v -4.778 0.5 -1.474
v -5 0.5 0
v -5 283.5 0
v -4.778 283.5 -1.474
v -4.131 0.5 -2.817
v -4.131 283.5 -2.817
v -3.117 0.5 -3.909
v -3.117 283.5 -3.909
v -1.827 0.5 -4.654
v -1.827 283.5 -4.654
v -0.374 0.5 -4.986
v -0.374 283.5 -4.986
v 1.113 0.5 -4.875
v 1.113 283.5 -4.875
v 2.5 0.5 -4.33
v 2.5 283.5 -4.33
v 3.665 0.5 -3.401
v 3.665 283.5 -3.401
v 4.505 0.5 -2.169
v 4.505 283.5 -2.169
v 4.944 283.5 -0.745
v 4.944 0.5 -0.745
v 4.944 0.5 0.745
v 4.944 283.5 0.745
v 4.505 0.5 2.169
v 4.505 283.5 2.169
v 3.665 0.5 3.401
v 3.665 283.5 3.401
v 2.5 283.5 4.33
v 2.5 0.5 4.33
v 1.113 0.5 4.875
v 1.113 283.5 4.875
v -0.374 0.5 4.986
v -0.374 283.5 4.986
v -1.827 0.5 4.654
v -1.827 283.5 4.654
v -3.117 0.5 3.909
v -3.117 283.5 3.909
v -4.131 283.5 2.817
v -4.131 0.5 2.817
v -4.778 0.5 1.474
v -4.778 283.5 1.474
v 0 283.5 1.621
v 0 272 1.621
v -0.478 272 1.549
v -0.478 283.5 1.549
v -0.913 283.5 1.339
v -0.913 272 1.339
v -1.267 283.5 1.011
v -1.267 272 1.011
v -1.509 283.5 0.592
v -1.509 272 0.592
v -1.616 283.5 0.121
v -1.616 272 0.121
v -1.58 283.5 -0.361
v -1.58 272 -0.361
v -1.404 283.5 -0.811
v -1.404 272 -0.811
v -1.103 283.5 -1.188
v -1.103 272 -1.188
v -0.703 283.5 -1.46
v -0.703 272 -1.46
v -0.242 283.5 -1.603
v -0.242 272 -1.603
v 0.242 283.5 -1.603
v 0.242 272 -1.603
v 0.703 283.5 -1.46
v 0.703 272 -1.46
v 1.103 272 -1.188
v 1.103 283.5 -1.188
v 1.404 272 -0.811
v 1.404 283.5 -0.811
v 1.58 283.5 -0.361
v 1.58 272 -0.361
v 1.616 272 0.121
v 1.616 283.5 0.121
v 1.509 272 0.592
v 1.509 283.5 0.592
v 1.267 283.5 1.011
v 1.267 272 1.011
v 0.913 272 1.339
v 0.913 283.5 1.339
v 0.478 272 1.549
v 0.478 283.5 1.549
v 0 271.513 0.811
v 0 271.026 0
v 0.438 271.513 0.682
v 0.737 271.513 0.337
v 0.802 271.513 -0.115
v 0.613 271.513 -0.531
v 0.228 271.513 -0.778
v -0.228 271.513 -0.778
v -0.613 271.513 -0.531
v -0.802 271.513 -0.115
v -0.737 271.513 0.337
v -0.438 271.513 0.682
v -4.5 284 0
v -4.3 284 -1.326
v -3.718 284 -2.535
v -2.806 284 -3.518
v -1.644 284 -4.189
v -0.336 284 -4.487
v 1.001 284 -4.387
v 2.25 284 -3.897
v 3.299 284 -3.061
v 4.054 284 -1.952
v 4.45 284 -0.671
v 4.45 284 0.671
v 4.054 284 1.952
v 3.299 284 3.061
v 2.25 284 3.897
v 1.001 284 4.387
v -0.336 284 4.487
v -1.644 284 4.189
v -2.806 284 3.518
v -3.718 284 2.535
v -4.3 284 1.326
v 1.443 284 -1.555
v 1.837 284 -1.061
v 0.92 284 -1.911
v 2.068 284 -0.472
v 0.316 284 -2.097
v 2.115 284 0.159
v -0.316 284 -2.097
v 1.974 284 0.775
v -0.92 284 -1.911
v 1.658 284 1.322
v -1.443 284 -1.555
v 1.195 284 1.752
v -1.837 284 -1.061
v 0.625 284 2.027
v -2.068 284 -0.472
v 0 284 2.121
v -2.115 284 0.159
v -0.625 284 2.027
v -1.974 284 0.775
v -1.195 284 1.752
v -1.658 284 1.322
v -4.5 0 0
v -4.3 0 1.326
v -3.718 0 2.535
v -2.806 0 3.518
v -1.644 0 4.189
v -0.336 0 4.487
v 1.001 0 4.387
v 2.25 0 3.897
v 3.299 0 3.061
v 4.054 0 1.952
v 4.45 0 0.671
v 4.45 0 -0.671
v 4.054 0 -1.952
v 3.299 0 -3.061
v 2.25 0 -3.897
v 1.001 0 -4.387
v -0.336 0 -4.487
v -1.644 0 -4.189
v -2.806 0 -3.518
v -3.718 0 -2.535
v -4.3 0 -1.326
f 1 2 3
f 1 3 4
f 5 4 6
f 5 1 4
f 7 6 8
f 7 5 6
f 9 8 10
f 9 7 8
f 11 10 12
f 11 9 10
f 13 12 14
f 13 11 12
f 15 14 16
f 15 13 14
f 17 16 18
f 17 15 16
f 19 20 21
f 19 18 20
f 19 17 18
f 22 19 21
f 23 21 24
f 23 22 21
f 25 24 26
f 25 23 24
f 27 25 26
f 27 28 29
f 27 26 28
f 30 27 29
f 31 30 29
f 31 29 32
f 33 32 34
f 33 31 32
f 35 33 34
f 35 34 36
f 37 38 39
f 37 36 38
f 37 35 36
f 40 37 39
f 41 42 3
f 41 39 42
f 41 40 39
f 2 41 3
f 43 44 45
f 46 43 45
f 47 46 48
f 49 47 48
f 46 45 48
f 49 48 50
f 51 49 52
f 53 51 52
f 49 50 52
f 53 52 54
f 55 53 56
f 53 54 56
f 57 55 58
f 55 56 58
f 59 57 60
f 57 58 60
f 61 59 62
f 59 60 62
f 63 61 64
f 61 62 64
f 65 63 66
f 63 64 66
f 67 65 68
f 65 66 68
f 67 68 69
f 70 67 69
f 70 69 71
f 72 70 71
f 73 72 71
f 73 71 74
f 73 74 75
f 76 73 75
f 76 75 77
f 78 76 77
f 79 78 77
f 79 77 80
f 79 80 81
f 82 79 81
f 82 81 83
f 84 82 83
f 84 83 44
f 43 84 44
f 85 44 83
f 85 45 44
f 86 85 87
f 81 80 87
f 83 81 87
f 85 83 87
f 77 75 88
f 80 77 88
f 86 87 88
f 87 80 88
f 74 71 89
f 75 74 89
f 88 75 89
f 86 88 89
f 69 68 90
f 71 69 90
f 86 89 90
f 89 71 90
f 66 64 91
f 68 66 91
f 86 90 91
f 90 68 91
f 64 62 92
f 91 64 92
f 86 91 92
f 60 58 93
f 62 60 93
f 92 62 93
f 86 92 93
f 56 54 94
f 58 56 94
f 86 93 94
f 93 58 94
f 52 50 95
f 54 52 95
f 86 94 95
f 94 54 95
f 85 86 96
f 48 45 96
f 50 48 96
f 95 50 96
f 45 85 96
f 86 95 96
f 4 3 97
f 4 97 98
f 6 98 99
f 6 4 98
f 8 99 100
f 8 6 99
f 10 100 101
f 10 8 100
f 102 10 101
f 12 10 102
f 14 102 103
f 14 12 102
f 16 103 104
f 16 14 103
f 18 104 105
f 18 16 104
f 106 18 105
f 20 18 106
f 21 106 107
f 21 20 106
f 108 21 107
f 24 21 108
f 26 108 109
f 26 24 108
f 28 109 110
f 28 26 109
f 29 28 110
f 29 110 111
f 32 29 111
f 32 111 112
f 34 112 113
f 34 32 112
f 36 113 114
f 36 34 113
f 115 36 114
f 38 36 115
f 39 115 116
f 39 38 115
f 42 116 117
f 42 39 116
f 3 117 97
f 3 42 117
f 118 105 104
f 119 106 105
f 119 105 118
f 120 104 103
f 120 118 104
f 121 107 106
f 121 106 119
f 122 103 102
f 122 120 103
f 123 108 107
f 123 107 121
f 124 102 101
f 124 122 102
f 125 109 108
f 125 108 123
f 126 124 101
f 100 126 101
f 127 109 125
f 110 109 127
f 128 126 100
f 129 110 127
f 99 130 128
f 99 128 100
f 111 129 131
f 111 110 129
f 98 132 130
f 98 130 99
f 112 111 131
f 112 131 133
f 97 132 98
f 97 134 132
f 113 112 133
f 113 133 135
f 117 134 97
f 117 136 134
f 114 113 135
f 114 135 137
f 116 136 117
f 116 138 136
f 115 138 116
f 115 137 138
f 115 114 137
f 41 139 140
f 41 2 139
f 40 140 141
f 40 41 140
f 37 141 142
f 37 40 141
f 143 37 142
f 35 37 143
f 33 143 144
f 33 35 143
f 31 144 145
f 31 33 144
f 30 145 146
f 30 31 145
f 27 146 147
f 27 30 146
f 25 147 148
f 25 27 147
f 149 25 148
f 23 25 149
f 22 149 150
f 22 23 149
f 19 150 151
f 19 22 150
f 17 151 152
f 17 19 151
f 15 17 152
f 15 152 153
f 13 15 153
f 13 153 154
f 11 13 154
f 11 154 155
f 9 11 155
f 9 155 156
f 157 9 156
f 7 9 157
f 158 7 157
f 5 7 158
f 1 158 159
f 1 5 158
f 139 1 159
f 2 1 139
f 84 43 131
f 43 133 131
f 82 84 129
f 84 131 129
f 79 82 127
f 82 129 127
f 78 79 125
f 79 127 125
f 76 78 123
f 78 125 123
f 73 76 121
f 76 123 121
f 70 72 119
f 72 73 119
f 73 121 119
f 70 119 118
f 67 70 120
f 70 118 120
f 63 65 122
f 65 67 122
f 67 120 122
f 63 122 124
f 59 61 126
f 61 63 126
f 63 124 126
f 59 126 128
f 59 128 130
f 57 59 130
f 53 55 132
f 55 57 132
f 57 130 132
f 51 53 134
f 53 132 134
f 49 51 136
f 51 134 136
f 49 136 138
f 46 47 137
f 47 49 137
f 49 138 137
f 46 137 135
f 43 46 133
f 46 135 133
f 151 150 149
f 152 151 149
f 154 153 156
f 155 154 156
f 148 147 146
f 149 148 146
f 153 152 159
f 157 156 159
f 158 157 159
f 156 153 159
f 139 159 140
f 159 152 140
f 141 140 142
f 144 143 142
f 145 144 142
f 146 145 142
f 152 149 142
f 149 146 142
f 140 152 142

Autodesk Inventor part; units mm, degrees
ref_plane "YZ Plane" through (0, 0, 0) normal (1, 0, 0) x (0, 1, 0)
ref_plane "XZ Plane" through (0, 0, 0) normal (0, 1, 0) x (-1, 0, 0)
ref_plane "XY Plane" through (0, 0, 0) normal (0, 0, 1) x (1, 0, 0)
sketch "Sketch1" plane through (0, 0, 0) normal (0, 1, 0) x (-1, 0, 0)
  circle A0 centre (0, 0) radius 5
  dimension "d0" = 10
extrude "Extrusion1" add sketch "Sketch1" along normal blind 284
sketch "Sketch2" plane through (0, 284, 0) normal (0, 1, 0) x (1, 0, 0)
  point P0 (0, 0)
  point P1 (0, 0)
hole "Hole1" at (0, 284, 0) direction (0, -1, 0) diameter 3.242 depth 12 tip angle 118 thread size "M4x0.7" class "6H" standard "ISO Metric profile"
chamfer "Chamfer1" distance 0.5 angle 45 3 edges at (0, 284, -1.621) (5, 284, 0) (5, 0, 0)
properties part number "CUT_ALU_10x284mm_Rod"
